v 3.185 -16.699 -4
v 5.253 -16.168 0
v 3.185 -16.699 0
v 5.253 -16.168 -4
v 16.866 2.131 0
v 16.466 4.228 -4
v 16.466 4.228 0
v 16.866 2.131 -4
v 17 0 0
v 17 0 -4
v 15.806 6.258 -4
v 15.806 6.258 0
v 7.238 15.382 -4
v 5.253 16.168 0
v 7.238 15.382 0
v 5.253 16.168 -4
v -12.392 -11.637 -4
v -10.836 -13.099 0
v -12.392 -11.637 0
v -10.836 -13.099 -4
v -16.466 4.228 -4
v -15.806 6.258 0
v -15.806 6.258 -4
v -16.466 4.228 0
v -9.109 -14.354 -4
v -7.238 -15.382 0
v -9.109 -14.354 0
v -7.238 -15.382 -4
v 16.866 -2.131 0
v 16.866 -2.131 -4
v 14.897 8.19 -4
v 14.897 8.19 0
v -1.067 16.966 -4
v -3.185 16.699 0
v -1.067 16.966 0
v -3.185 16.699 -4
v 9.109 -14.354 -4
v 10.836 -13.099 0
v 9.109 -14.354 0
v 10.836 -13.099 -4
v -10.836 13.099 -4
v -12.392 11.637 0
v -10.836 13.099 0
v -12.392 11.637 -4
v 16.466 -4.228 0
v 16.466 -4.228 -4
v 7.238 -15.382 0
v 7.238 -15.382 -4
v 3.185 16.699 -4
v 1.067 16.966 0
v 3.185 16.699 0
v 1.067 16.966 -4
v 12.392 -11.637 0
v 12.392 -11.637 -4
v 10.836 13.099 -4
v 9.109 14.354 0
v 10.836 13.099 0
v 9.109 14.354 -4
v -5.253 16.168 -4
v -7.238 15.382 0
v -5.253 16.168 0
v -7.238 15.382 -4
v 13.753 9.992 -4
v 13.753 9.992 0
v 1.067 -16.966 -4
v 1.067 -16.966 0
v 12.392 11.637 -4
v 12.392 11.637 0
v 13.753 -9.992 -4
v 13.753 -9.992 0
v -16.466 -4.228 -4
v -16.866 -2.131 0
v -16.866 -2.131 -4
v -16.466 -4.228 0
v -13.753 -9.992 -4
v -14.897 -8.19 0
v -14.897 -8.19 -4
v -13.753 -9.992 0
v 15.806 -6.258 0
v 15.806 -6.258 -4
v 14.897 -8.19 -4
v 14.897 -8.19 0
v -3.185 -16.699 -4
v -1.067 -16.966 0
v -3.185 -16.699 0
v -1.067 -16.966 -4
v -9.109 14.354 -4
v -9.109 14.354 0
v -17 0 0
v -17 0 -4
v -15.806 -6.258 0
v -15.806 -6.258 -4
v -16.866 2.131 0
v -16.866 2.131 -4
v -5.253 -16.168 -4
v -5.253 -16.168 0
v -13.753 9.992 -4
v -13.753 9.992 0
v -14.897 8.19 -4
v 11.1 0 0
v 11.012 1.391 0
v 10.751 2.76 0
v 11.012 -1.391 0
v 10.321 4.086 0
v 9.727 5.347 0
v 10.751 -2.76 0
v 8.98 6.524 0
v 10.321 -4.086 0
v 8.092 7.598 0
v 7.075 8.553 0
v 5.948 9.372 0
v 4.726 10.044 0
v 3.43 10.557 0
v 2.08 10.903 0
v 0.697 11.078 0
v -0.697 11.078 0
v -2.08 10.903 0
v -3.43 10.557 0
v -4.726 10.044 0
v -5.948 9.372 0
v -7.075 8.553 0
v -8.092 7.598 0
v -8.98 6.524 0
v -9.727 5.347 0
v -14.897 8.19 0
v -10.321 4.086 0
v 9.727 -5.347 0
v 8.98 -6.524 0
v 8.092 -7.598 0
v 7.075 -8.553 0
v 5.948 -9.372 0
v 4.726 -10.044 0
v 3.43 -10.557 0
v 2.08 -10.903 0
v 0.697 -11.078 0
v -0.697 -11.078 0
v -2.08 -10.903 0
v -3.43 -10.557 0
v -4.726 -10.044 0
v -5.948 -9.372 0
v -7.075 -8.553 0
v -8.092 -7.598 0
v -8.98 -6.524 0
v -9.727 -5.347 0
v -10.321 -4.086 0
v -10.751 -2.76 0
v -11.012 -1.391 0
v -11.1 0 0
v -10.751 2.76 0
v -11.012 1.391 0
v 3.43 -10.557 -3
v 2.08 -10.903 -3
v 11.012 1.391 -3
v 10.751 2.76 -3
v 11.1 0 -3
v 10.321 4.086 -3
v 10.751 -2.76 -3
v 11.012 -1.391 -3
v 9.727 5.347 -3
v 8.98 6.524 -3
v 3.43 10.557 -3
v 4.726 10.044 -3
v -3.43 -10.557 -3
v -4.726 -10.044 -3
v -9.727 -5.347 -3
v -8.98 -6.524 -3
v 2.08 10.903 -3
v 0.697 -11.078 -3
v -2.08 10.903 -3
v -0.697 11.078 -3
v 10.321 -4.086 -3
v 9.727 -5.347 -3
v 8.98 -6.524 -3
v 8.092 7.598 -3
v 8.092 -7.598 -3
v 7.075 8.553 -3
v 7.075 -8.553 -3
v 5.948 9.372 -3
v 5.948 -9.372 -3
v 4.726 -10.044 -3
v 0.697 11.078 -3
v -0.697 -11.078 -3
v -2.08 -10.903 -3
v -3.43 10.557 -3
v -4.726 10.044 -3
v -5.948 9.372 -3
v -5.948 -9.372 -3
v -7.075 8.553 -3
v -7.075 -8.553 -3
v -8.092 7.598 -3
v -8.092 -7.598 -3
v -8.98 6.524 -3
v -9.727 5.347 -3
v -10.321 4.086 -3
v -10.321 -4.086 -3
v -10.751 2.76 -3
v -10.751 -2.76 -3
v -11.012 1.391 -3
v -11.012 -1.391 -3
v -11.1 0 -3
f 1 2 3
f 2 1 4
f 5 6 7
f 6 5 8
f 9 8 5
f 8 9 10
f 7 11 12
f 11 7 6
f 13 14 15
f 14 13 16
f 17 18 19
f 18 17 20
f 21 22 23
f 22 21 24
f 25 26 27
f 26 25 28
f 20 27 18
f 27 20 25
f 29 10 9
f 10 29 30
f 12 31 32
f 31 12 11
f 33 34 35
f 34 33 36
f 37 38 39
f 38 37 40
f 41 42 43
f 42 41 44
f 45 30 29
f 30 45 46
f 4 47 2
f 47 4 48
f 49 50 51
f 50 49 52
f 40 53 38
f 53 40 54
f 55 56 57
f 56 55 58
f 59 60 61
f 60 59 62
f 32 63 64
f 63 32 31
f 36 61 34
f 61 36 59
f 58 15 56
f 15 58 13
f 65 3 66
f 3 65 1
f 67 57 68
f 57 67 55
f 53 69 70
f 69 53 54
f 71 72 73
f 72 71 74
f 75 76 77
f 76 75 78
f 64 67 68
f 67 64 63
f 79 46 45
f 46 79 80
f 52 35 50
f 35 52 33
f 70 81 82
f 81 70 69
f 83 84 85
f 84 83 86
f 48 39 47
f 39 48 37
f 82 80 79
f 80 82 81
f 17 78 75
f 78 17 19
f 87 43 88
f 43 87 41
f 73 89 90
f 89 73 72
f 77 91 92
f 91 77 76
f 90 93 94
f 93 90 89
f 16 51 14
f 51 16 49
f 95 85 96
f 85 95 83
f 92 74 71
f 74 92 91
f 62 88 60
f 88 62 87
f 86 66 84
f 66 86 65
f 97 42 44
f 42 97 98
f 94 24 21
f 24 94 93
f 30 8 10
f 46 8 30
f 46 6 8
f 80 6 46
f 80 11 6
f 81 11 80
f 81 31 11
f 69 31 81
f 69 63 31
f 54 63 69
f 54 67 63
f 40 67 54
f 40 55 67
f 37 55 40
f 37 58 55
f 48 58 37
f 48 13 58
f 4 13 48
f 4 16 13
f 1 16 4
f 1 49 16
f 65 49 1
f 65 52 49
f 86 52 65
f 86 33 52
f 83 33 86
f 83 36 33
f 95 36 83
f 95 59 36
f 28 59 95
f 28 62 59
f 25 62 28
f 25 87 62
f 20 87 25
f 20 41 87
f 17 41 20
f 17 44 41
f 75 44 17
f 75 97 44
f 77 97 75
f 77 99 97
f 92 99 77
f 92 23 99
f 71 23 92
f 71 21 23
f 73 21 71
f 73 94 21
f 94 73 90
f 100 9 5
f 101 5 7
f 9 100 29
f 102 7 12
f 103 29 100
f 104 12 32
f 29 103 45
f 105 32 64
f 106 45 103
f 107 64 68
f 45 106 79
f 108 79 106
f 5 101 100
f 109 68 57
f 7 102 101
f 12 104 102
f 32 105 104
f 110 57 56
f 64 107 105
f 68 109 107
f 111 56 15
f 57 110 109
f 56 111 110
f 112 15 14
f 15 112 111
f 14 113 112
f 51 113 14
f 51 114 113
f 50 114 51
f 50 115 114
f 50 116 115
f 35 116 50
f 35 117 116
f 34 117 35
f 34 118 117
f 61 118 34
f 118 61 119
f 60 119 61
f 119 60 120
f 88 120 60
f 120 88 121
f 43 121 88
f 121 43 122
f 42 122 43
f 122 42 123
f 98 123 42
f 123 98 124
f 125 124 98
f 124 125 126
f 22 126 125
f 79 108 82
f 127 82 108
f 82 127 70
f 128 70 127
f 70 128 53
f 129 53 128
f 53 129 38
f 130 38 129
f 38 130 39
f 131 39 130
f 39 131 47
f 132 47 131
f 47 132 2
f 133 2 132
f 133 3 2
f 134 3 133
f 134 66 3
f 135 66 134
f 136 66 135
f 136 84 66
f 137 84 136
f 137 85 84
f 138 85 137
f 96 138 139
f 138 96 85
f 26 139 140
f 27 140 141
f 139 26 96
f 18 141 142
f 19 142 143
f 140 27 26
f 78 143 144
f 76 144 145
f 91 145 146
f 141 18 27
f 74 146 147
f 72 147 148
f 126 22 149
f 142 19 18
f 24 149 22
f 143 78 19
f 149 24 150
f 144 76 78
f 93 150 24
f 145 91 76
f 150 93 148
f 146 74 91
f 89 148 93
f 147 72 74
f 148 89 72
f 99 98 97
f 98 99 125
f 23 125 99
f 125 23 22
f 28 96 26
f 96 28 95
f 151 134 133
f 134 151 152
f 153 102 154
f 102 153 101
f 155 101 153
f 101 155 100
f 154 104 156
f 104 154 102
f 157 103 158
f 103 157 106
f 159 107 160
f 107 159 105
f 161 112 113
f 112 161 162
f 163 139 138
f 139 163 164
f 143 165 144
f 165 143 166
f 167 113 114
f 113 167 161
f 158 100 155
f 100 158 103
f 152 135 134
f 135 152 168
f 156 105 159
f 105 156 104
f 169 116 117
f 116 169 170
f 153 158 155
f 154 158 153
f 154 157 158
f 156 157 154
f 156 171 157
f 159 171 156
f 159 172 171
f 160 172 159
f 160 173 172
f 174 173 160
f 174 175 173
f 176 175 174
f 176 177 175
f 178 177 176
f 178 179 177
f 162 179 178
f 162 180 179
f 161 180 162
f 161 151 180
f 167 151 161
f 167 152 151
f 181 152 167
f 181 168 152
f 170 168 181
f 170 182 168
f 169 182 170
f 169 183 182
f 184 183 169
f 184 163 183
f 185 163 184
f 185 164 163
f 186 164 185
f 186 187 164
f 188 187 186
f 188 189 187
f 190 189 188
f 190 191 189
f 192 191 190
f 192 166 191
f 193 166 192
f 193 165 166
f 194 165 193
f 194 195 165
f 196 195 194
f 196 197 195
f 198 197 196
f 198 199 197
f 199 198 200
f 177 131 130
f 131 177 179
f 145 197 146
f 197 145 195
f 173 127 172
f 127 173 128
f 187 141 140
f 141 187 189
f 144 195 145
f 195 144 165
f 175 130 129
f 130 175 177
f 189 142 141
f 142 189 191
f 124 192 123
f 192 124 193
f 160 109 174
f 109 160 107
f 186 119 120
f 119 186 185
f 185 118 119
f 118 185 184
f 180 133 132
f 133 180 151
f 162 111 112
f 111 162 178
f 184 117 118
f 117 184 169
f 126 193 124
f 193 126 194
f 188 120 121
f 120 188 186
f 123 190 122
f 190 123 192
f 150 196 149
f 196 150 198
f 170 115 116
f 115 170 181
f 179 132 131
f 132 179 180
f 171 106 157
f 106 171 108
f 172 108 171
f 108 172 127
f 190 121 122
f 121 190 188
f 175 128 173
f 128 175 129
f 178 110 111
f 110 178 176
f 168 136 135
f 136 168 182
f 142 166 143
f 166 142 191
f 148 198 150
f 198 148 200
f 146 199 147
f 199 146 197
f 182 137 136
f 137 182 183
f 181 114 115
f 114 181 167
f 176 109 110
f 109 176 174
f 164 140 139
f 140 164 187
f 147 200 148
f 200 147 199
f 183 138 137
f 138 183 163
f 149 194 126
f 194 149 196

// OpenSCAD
$fn = 50;


difference() {
	union() {
		translate(v = [0, 0, -4.0000000000]) {
			cylinder(h = 4, r = 17.0000000000);
		}
	}
	union() {
		#translate(v = [0, 0, -3.0000000000]) {
			cylinder(h = 3, r = 11.1000000000);
		}
	}
}
